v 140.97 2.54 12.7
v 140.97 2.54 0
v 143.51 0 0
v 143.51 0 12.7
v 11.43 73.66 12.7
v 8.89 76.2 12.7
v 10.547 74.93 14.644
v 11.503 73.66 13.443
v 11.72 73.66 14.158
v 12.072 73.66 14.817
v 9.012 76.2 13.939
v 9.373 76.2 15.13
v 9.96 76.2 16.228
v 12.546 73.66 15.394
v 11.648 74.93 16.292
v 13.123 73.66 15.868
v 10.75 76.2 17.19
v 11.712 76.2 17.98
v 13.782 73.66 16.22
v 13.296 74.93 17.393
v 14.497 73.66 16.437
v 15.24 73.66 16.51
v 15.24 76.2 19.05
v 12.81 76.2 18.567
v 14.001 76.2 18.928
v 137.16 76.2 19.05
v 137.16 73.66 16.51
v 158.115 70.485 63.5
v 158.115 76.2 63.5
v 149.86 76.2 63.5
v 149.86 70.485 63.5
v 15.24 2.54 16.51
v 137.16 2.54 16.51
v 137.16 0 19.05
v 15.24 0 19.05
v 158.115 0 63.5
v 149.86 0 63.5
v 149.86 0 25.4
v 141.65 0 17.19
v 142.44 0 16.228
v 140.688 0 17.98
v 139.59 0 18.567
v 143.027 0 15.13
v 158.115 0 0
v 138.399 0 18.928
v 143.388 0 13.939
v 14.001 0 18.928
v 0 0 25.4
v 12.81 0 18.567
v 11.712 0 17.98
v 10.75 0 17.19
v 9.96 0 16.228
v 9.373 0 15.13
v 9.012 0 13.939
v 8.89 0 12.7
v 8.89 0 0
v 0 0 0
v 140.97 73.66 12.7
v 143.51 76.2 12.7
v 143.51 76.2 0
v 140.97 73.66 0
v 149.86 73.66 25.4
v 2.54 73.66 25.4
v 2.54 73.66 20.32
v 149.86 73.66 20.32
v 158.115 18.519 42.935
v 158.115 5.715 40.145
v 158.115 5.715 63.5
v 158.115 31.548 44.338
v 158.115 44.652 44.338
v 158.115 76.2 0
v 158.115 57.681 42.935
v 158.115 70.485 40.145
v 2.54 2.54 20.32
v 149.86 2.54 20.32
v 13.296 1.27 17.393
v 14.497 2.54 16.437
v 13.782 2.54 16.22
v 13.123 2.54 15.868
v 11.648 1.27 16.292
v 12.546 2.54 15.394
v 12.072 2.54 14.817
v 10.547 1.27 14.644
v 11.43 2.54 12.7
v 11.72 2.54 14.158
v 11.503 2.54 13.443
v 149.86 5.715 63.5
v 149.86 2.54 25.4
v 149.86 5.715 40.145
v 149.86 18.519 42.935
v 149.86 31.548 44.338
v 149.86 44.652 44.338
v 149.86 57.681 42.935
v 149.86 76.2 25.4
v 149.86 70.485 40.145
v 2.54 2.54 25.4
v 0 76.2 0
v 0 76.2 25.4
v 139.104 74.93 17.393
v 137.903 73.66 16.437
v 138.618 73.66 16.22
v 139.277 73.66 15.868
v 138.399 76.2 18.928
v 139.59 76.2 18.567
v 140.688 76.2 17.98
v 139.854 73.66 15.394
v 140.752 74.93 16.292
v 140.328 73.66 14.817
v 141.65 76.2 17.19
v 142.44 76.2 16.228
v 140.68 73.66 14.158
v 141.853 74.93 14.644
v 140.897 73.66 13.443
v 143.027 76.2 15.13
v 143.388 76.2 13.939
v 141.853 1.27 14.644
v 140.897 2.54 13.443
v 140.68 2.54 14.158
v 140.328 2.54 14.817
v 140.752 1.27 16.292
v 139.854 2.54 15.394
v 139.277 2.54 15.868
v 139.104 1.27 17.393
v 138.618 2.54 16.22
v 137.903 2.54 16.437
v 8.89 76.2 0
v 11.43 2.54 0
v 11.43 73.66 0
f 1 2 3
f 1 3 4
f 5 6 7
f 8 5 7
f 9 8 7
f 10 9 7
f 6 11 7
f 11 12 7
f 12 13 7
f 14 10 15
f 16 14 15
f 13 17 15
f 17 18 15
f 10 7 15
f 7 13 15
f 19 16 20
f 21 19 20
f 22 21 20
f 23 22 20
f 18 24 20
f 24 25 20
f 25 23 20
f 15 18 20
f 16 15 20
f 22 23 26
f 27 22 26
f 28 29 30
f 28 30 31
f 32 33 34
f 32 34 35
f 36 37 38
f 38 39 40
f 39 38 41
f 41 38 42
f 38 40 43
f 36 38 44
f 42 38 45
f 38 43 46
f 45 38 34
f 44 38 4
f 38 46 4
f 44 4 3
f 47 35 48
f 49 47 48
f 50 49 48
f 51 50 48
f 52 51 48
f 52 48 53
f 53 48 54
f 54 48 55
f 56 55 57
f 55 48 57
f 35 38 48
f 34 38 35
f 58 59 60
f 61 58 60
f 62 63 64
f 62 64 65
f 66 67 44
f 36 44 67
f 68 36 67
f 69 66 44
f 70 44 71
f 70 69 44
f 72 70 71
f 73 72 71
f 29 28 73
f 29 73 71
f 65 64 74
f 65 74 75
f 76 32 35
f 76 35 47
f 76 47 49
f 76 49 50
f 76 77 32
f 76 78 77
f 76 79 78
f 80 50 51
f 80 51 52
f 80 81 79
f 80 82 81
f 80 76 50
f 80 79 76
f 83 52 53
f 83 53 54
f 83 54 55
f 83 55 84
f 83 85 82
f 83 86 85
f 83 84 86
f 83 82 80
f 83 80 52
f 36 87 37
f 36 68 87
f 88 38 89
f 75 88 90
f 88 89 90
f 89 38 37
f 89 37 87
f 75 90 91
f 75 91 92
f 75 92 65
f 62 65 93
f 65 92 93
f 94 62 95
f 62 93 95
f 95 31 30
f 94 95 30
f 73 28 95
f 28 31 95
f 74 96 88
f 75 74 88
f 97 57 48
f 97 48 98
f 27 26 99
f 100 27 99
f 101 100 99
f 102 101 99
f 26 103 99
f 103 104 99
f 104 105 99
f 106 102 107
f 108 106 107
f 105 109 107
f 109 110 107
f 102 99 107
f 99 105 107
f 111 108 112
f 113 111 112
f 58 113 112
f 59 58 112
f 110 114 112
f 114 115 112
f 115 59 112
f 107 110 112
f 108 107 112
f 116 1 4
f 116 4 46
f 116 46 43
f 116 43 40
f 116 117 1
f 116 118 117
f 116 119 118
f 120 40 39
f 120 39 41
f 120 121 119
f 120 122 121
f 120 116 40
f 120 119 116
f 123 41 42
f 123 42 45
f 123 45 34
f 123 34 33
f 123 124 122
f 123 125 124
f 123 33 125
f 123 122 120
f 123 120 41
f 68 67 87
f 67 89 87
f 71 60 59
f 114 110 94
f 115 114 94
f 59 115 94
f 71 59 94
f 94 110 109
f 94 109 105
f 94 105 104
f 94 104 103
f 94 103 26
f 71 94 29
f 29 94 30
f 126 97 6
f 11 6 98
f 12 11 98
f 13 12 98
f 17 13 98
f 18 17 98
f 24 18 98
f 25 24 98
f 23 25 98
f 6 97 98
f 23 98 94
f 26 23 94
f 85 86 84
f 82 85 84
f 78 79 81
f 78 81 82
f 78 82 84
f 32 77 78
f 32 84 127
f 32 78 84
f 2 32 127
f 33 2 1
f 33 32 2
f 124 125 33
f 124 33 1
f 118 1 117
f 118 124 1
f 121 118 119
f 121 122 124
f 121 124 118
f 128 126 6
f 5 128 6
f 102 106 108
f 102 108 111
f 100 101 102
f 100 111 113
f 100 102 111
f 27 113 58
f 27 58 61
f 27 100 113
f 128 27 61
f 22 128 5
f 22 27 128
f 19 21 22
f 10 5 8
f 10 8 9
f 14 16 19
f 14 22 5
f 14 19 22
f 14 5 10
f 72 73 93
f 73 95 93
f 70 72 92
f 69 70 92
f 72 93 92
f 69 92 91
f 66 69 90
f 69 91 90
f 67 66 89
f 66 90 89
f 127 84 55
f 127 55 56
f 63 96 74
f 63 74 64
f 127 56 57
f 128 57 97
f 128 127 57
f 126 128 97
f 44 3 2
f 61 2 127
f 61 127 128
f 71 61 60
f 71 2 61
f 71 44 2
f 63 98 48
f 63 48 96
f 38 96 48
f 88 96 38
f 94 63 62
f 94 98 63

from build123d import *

# Parameters (mm, degrees)
F0_W           = 152.4
F0_H           = 76.2
F1_DEPTH       = 25.4
F2_W           = 147.32
F2_H           = 71.12
F3_DEPTH       = 5.08
F5_DEPTH       = 2.54
F6_SIZE        = 2.53999
F8_DEPTH       = 2.54
F9_SIZE        = 2.53999
F10_W          = 64.77
F10_H          = 25.4
F10_W_2        = 5.715
F11_DEPTH      = 5.715
F11_DEPTH_BACK = 2.54


# Not quite as in the source:
# - a fillet or chamfer is up to 0.001 mm smaller than in the source, because OpenCascade refuses the exact size


with BuildPart() as f1:
    # F0 (on Top) → F1 (new body)
    with BuildSketch(Plane.XY):
        with Locations((76.2, 38.1)):
            Rectangle(F0_W, F0_H)
    extrude(amount=F1_DEPTH)

    # F2 (on face) → F3 (cut)
    with BuildSketch(Plane.XY.offset(25.4)):
        with Locations((76.2, 38.1)):
            Rectangle(F2_W, F2_H)
    extrude(amount=-F3_DEPTH, mode=Mode.SUBTRACT)

    # F4 (on face) → F5 (cut)
    with BuildSketch(Plane.XZ):
        with BuildLine():
            Line((8.89, 12.7), (8.89, 0))
            Line((8.89, 0), (143.51, 0))
            Line((143.51, 0), (143.51, 12.7))
            ThreePointArc((143.51, 12.7), (141.6501280605, 17.1901280605), (137.16, 19.05))
            Line((137.16, 19.05), (15.24, 19.05))
            ThreePointArc((15.24, 19.05), (10.7498719395, 17.1901280605), (8.89, 12.7))
        make_face()
    extrude(amount=-F5_DEPTH, mode=Mode.SUBTRACT)

    # F6 (size 2.54 in the source; OpenCascade refuses exactly that, so slightly less here)
    f6_edges = [f1.edges().sort_by_distance(p)[0] for p in [
        (76.2, 2.54, 19.05),
    ]]
    chamfer(f6_edges, length=F6_SIZE)

    # F7 (on face) → F8 (cut)
    with BuildSketch(Plane(origin=(0, 76.2, 0), x_dir=(-1, 0, 0), z_dir=(0, 1, 0))):
        with BuildLine():
            Line((-143.51, 12.7), (-143.51, 0))
            Line((-143.51, 0), (-8.89, 0))
            Line((-8.89, 0), (-8.89, 12.7))
            ThreePointArc((-8.89, 12.7), (-10.7498719395, 17.1901280605), (-15.24, 19.05))
            Line((-15.24, 19.05), (-137.16, 19.05))
            ThreePointArc((-137.16, 19.05), (-141.6501280605, 17.1901280605), (-143.51, 12.7))
        make_face()
    extrude(amount=-F8_DEPTH, mode=Mode.SUBTRACT)

    # F9 (size 2.54 in the source; OpenCascade refuses exactly that, so slightly less here)
    f9_edges = [f1.edges().sort_by_distance(p)[0] for p in [
        (76.2, 73.66, 19.05),
    ]]
    chamfer(f9_edges, length=F9_SIZE)

    # F10 (on face) → F11 (join, two sides)
    with BuildSketch(Plane.YZ.offset(152.4)) as f11_sk:
        with BuildLine():
            Line((5.715, 40.1454963986), (5.715, 25.4))
            Line((5.715, 25.4), (70.485, 25.4))
            Line((70.485, 25.4), (70.485, 40.1454963986))
            ThreePointArc((70.485, 40.1454963986), (38.1, 44.5135), (5.715, 40.1454963986))
        make_face()
        with Locations((38.1, 12.7)):
            Rectangle(F10_W, F10_H)
        with Locations((2.8575, 12.7)):
            Rectangle(F10_W_2, F10_H)
        Polygon((0, 63.5), (0, 25.4), (5.715, 25.4), (5.715, 40.1454963986), (5.715, 63.5), align=None)
        Polygon((70.485, 40.1454963986), (70.485, 25.4), (76.2, 25.4), (76.2, 63.5), (70.485, 63.5), align=None)
        with Locations((73.3425, 12.7)):
            Rectangle(F10_W_2, F10_H)
    extrude(amount=F11_DEPTH)
    extrude(f11_sk.sketch, amount=-F11_DEPTH_BACK)


solid = f1.part
